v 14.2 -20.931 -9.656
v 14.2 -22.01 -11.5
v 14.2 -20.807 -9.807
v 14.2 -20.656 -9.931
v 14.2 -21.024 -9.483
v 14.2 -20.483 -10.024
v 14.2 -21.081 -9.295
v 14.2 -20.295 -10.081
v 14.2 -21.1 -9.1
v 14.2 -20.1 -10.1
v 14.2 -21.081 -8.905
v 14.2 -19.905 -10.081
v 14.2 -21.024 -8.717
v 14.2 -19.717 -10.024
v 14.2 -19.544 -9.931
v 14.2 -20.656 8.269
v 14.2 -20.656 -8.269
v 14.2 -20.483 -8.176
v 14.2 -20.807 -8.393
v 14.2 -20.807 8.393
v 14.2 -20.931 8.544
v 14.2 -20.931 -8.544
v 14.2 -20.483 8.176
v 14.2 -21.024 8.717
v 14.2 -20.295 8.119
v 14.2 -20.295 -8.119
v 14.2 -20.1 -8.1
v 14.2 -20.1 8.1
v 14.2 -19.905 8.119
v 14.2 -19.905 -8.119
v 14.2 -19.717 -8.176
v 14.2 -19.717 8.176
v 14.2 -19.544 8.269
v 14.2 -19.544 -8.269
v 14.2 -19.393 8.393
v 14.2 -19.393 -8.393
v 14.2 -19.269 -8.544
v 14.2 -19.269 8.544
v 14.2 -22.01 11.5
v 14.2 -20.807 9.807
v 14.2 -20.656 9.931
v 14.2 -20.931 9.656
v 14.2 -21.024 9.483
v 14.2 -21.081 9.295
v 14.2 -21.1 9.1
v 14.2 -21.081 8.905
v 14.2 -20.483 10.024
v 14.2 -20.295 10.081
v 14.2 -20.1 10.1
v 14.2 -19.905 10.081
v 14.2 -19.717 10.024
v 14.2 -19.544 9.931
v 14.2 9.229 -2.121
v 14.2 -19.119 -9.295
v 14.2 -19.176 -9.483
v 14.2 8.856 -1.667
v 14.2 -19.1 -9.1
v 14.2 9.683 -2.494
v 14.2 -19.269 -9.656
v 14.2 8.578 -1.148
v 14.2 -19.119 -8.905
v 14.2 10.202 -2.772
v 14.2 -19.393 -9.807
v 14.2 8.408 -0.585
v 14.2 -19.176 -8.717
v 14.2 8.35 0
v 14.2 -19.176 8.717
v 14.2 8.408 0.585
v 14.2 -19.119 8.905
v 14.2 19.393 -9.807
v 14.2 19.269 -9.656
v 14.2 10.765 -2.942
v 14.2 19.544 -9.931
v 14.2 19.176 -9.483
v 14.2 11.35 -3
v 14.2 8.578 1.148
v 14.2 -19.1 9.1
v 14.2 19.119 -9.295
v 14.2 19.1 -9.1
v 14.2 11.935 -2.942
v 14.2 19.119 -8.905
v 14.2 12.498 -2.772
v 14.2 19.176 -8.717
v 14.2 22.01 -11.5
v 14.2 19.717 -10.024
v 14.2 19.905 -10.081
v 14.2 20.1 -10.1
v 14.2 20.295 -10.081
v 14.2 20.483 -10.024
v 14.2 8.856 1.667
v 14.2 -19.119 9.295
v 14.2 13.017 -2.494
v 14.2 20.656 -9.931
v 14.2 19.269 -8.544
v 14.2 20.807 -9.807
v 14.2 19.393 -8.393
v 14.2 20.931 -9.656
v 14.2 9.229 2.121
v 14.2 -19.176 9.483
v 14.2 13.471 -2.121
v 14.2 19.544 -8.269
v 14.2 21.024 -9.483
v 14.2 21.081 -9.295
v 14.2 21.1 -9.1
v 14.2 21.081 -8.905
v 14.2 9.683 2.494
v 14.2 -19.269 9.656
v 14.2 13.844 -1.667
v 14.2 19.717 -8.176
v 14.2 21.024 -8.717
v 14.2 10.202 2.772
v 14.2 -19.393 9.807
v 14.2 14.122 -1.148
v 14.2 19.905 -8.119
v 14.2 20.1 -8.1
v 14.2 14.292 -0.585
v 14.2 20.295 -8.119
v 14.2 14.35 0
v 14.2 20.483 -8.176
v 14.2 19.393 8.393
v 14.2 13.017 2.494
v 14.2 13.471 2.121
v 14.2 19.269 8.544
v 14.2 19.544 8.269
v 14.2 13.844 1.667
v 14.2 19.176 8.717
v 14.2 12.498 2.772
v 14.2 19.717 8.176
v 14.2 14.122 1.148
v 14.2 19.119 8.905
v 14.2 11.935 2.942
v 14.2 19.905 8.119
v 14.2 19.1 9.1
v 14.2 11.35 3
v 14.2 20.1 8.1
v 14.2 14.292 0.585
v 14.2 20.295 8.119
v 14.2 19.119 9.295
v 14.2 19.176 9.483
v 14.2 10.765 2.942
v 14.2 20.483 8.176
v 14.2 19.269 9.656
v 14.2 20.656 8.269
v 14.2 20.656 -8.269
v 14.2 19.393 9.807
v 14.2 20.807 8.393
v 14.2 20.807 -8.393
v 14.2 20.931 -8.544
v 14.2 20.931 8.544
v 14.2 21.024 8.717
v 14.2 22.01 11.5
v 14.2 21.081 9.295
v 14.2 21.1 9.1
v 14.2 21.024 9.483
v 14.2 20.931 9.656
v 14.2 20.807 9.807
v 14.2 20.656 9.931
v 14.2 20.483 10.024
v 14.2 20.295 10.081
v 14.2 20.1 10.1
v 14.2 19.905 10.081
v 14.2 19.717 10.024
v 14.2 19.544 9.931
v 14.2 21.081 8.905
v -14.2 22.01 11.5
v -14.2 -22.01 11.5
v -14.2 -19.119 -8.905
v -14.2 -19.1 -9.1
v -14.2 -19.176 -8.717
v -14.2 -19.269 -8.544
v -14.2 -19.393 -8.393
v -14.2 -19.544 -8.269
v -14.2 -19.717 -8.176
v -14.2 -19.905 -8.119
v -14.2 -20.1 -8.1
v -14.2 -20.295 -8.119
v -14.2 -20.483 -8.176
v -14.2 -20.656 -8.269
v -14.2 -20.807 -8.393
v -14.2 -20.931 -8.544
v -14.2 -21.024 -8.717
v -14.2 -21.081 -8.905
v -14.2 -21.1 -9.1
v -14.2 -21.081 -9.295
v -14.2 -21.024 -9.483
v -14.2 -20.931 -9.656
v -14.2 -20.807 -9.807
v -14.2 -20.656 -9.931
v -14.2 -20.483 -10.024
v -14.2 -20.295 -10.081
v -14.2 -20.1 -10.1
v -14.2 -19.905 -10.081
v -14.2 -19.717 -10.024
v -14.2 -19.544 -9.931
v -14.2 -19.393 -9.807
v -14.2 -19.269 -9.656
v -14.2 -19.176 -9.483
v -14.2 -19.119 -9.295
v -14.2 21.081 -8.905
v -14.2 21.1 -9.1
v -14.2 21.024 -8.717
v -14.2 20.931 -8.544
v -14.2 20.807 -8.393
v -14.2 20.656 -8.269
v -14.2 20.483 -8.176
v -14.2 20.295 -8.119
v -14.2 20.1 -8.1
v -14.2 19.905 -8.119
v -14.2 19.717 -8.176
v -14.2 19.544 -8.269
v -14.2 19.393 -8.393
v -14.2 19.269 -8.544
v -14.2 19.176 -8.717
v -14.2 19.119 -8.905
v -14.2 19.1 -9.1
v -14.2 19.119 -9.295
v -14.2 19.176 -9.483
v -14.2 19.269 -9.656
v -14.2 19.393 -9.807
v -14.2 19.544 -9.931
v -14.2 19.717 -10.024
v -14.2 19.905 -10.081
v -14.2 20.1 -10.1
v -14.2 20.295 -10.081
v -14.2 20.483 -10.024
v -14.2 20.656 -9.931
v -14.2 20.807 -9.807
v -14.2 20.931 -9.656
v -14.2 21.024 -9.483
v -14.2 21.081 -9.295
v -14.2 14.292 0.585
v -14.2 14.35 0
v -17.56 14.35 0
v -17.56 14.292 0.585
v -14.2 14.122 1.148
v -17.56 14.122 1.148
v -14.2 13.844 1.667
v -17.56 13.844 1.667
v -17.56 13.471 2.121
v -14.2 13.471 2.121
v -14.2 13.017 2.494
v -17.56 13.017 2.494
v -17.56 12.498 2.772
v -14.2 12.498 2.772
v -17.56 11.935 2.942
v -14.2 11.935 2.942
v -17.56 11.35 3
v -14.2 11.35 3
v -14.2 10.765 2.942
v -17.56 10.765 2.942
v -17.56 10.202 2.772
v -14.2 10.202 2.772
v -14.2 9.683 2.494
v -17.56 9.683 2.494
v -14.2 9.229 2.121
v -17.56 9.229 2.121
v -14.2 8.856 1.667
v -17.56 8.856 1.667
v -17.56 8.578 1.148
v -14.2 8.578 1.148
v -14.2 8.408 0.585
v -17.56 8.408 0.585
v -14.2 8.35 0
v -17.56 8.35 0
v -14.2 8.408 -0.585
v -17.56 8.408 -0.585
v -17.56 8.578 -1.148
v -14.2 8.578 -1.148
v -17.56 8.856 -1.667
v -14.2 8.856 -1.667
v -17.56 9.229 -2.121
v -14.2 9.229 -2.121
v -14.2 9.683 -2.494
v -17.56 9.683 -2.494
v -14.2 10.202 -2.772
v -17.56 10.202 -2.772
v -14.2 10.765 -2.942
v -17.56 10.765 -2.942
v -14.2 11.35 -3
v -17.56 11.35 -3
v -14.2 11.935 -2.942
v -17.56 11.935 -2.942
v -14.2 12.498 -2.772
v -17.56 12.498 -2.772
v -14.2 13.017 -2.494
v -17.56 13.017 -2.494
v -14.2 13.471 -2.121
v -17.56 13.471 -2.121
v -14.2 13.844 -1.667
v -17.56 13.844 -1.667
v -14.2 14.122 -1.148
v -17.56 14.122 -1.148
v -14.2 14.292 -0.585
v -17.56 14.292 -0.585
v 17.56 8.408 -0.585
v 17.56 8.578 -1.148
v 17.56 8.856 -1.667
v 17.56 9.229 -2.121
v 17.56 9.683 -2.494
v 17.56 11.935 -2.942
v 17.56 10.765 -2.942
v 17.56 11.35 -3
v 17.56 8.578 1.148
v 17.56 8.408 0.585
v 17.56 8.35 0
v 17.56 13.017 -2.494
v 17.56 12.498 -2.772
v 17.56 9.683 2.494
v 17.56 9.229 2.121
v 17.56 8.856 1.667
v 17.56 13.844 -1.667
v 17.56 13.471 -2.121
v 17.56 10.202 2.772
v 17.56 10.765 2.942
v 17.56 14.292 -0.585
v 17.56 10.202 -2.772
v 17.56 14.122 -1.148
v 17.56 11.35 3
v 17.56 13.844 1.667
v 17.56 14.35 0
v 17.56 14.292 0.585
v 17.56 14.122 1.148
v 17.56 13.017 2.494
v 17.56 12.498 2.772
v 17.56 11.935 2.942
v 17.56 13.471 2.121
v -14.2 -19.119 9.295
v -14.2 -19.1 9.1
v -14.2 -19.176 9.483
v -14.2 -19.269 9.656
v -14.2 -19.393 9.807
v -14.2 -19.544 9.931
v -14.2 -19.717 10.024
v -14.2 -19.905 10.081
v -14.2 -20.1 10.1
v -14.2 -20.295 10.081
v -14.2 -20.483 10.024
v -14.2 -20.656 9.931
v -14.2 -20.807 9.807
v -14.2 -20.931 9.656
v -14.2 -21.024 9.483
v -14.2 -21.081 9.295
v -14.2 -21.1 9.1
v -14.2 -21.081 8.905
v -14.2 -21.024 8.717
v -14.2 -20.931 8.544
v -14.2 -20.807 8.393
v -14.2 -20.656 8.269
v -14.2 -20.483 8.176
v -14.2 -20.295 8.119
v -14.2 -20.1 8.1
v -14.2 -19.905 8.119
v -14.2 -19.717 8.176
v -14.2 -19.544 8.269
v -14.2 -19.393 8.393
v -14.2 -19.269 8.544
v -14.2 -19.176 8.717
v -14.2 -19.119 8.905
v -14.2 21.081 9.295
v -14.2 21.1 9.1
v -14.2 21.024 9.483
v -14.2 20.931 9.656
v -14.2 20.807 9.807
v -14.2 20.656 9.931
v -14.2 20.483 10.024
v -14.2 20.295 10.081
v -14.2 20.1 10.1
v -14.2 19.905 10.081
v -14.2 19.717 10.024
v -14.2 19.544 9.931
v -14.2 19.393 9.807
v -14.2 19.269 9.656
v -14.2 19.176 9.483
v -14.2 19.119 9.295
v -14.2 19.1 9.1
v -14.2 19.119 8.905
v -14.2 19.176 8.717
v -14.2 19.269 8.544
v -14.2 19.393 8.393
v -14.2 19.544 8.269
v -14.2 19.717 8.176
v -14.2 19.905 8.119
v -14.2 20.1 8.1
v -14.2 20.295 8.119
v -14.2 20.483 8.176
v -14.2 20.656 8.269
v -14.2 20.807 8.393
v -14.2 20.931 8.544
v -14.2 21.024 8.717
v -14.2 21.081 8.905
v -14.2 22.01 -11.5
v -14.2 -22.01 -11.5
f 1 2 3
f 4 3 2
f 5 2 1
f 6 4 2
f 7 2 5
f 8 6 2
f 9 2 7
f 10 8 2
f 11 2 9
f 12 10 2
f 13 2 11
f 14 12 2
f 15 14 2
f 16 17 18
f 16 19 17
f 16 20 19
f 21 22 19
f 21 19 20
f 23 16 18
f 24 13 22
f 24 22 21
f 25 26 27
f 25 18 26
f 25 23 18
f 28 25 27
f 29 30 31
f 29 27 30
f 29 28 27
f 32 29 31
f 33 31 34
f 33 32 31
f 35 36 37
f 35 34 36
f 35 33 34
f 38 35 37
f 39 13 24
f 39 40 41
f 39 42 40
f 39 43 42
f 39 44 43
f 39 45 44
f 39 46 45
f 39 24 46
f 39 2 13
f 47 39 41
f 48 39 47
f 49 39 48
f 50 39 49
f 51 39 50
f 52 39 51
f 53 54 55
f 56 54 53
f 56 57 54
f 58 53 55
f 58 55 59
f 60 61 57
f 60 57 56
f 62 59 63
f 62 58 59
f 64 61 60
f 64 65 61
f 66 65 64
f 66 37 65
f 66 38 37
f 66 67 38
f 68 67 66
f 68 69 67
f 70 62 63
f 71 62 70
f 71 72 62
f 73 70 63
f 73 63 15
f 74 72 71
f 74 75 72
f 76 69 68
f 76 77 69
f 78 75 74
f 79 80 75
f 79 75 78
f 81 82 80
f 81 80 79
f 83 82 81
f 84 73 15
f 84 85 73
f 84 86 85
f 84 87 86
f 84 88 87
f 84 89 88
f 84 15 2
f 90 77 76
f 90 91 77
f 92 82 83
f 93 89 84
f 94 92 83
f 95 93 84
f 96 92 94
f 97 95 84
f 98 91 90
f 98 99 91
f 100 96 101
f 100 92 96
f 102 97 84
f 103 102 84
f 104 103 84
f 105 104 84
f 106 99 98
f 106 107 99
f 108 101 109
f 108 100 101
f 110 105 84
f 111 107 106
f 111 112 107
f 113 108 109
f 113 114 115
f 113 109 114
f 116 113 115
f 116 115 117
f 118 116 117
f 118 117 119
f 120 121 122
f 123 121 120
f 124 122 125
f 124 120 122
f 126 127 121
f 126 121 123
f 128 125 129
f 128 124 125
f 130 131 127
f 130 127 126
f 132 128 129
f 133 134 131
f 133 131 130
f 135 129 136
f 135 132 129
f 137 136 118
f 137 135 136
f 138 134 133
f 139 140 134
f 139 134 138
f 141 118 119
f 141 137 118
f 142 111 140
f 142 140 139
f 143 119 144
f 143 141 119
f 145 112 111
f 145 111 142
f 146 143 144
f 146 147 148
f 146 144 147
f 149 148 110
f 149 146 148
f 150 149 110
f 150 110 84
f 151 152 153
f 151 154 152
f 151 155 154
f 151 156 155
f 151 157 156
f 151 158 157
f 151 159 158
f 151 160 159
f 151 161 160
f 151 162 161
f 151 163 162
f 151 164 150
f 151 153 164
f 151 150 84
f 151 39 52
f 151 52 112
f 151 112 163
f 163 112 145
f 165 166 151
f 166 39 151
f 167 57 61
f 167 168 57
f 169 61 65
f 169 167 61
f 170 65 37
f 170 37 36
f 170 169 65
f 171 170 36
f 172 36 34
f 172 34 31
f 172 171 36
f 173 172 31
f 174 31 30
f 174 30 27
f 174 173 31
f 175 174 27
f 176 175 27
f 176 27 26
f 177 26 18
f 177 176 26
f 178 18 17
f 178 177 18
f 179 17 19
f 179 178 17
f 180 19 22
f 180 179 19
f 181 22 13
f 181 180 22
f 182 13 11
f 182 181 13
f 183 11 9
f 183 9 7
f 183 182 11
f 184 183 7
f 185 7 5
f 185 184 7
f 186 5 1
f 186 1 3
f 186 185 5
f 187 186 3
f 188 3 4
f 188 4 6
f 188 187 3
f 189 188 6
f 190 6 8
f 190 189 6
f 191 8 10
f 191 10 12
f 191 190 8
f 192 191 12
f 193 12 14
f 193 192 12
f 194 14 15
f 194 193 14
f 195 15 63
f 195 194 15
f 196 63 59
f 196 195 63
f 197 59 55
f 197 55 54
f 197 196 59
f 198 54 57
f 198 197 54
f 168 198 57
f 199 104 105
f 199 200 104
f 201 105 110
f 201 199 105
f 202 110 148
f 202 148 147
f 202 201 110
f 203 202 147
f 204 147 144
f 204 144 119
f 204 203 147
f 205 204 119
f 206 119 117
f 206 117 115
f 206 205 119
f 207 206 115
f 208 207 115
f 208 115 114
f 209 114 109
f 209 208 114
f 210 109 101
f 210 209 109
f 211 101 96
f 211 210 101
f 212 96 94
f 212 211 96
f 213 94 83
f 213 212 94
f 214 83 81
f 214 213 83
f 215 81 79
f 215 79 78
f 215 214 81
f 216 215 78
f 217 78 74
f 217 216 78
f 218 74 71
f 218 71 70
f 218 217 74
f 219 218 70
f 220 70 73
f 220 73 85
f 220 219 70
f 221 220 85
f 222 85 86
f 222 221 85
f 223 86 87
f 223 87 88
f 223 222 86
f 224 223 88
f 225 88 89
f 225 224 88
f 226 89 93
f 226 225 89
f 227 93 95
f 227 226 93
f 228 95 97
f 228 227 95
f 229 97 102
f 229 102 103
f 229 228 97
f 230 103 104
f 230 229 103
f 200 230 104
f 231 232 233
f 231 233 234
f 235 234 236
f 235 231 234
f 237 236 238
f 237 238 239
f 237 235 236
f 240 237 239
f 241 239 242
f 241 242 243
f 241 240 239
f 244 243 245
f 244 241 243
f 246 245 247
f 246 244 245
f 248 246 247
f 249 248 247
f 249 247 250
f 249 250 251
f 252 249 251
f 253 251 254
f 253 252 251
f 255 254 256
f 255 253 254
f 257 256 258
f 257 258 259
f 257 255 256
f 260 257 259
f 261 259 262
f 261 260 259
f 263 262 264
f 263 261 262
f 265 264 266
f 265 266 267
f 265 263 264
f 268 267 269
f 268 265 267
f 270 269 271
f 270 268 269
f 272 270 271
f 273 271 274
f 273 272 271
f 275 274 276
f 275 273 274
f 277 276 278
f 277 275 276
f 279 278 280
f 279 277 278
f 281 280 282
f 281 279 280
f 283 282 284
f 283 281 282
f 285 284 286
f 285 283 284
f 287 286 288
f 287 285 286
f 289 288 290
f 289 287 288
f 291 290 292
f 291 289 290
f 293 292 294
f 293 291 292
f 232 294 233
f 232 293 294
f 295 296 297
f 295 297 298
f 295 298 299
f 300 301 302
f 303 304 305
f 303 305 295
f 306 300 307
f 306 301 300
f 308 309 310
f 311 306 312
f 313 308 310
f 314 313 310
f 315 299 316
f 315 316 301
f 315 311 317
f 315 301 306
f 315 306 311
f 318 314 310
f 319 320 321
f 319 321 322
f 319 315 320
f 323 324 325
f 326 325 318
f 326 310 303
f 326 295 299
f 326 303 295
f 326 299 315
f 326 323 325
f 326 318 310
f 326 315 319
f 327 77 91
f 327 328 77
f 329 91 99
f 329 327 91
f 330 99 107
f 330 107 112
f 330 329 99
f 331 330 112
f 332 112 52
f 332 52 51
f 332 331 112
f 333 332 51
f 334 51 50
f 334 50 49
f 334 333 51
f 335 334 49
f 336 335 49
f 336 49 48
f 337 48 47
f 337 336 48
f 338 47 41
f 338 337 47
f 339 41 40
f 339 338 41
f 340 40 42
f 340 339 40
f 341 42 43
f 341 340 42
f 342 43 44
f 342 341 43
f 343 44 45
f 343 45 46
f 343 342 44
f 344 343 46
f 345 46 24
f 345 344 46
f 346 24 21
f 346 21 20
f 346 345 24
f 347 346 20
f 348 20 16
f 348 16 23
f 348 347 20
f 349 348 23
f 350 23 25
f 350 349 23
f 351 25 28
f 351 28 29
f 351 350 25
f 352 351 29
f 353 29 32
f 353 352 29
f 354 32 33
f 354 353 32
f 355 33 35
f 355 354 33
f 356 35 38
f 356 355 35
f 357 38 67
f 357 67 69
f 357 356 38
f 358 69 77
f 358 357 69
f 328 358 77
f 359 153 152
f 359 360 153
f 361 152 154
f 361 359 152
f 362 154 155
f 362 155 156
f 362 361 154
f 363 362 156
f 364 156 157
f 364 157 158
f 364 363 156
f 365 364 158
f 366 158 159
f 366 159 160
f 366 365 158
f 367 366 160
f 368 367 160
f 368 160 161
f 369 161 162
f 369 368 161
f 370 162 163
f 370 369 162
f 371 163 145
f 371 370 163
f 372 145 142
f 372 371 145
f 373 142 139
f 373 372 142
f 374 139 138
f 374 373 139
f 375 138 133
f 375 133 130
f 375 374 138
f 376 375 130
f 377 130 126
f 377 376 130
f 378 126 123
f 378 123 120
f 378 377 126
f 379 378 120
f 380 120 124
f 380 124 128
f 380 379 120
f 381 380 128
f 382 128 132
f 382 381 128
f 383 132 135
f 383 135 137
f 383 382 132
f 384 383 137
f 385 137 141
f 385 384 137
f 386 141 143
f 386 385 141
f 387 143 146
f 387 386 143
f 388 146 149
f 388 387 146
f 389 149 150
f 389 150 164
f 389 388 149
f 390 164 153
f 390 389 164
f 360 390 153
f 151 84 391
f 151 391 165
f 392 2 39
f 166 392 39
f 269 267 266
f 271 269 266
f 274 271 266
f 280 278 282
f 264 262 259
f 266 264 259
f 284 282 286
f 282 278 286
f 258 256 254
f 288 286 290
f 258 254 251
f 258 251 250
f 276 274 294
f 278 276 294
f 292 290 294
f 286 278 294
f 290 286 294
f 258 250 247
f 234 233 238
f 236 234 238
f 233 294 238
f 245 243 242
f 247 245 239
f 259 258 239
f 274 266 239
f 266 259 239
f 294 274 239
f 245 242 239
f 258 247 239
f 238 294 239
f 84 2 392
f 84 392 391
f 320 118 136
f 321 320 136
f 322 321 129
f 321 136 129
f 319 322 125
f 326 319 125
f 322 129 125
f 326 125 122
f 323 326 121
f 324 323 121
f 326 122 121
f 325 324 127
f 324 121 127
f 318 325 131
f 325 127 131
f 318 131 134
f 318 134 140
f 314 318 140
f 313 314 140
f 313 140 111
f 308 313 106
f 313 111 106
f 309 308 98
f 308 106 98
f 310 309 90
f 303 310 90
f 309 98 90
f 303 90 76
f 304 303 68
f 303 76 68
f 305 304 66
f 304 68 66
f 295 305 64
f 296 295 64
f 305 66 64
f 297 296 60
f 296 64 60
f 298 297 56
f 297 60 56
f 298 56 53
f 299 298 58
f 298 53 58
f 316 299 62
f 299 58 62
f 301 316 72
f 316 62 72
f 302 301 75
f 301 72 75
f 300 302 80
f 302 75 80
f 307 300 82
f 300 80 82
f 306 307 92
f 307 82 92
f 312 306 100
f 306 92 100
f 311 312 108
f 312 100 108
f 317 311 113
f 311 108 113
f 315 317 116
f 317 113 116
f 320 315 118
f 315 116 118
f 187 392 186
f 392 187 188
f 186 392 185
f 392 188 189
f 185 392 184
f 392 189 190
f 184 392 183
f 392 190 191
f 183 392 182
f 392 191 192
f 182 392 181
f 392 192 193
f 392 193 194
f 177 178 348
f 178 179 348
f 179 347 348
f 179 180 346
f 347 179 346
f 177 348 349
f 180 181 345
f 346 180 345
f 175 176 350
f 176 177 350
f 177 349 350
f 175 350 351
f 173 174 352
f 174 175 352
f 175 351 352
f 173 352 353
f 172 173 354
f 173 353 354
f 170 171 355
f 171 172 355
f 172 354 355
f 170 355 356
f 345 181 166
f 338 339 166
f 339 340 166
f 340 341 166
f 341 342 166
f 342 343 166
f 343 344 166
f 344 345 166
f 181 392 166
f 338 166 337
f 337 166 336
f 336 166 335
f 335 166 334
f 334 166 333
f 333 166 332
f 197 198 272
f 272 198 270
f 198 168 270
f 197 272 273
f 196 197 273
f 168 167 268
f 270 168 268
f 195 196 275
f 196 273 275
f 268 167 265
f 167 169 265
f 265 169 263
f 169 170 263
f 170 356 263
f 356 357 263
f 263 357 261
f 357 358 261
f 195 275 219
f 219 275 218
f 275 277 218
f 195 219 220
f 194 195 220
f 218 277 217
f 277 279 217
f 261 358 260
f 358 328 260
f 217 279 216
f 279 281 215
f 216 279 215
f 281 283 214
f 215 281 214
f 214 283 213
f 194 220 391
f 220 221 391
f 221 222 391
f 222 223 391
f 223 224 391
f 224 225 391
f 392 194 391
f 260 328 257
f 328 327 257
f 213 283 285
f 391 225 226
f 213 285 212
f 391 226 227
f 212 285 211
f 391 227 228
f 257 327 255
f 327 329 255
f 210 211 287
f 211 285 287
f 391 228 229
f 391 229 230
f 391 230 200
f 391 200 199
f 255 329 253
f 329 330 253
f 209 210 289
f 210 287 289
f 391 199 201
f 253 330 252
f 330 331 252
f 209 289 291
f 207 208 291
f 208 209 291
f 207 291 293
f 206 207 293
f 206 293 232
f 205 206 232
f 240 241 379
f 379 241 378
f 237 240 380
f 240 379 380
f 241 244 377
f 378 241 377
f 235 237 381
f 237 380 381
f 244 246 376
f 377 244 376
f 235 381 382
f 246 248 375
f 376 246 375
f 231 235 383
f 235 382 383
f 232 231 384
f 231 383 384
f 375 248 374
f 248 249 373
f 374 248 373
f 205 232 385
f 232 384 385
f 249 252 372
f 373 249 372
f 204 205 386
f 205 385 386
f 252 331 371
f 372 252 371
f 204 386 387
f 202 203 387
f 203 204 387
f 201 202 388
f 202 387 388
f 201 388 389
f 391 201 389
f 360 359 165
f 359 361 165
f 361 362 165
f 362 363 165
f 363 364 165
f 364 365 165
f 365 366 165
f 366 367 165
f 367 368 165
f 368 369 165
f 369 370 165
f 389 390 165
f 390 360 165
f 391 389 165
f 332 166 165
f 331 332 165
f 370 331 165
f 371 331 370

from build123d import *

# Parameters (mm, degrees)
SKETCH_W     = 44.02
SKETCH_H     = 23
SKETCH_R     = 1
PAD_DEPTH    = 14.2
SKETCH001_R  = 3
PAD001_DEPTH = 3.36


with BuildPart() as part:
    # Sketch → Pad (new body, symmetric)
    with BuildSketch(Plane.YZ):
        Rectangle(SKETCH_W, SKETCH_H)
        with Locations((-20.1, -9.1)):
            Circle(SKETCH_R, mode=Mode.SUBTRACT)
        with Locations((20.1, -9.1)):
            Circle(SKETCH_R, mode=Mode.SUBTRACT)
        with Locations((-20.1, 9.1)):
            Circle(SKETCH_R, mode=Mode.SUBTRACT)
        with Locations((20.1, 9.1)):
            Circle(SKETCH_R, mode=Mode.SUBTRACT)
    extrude(amount=PAD_DEPTH, both=True)

    # Sketch001 (on Face10 of Pad) → Pad001 (join)
    with BuildSketch(Plane.YZ.offset(14.2)):
        with Locations((11.35, 0)):
            Circle(SKETCH001_R)
    pad001 = extrude(amount=PAD001_DEPTH)

    # Mirrored: Pad001 across YZ
    add(pad001.mirror(Plane.YZ))


solid = part.part
